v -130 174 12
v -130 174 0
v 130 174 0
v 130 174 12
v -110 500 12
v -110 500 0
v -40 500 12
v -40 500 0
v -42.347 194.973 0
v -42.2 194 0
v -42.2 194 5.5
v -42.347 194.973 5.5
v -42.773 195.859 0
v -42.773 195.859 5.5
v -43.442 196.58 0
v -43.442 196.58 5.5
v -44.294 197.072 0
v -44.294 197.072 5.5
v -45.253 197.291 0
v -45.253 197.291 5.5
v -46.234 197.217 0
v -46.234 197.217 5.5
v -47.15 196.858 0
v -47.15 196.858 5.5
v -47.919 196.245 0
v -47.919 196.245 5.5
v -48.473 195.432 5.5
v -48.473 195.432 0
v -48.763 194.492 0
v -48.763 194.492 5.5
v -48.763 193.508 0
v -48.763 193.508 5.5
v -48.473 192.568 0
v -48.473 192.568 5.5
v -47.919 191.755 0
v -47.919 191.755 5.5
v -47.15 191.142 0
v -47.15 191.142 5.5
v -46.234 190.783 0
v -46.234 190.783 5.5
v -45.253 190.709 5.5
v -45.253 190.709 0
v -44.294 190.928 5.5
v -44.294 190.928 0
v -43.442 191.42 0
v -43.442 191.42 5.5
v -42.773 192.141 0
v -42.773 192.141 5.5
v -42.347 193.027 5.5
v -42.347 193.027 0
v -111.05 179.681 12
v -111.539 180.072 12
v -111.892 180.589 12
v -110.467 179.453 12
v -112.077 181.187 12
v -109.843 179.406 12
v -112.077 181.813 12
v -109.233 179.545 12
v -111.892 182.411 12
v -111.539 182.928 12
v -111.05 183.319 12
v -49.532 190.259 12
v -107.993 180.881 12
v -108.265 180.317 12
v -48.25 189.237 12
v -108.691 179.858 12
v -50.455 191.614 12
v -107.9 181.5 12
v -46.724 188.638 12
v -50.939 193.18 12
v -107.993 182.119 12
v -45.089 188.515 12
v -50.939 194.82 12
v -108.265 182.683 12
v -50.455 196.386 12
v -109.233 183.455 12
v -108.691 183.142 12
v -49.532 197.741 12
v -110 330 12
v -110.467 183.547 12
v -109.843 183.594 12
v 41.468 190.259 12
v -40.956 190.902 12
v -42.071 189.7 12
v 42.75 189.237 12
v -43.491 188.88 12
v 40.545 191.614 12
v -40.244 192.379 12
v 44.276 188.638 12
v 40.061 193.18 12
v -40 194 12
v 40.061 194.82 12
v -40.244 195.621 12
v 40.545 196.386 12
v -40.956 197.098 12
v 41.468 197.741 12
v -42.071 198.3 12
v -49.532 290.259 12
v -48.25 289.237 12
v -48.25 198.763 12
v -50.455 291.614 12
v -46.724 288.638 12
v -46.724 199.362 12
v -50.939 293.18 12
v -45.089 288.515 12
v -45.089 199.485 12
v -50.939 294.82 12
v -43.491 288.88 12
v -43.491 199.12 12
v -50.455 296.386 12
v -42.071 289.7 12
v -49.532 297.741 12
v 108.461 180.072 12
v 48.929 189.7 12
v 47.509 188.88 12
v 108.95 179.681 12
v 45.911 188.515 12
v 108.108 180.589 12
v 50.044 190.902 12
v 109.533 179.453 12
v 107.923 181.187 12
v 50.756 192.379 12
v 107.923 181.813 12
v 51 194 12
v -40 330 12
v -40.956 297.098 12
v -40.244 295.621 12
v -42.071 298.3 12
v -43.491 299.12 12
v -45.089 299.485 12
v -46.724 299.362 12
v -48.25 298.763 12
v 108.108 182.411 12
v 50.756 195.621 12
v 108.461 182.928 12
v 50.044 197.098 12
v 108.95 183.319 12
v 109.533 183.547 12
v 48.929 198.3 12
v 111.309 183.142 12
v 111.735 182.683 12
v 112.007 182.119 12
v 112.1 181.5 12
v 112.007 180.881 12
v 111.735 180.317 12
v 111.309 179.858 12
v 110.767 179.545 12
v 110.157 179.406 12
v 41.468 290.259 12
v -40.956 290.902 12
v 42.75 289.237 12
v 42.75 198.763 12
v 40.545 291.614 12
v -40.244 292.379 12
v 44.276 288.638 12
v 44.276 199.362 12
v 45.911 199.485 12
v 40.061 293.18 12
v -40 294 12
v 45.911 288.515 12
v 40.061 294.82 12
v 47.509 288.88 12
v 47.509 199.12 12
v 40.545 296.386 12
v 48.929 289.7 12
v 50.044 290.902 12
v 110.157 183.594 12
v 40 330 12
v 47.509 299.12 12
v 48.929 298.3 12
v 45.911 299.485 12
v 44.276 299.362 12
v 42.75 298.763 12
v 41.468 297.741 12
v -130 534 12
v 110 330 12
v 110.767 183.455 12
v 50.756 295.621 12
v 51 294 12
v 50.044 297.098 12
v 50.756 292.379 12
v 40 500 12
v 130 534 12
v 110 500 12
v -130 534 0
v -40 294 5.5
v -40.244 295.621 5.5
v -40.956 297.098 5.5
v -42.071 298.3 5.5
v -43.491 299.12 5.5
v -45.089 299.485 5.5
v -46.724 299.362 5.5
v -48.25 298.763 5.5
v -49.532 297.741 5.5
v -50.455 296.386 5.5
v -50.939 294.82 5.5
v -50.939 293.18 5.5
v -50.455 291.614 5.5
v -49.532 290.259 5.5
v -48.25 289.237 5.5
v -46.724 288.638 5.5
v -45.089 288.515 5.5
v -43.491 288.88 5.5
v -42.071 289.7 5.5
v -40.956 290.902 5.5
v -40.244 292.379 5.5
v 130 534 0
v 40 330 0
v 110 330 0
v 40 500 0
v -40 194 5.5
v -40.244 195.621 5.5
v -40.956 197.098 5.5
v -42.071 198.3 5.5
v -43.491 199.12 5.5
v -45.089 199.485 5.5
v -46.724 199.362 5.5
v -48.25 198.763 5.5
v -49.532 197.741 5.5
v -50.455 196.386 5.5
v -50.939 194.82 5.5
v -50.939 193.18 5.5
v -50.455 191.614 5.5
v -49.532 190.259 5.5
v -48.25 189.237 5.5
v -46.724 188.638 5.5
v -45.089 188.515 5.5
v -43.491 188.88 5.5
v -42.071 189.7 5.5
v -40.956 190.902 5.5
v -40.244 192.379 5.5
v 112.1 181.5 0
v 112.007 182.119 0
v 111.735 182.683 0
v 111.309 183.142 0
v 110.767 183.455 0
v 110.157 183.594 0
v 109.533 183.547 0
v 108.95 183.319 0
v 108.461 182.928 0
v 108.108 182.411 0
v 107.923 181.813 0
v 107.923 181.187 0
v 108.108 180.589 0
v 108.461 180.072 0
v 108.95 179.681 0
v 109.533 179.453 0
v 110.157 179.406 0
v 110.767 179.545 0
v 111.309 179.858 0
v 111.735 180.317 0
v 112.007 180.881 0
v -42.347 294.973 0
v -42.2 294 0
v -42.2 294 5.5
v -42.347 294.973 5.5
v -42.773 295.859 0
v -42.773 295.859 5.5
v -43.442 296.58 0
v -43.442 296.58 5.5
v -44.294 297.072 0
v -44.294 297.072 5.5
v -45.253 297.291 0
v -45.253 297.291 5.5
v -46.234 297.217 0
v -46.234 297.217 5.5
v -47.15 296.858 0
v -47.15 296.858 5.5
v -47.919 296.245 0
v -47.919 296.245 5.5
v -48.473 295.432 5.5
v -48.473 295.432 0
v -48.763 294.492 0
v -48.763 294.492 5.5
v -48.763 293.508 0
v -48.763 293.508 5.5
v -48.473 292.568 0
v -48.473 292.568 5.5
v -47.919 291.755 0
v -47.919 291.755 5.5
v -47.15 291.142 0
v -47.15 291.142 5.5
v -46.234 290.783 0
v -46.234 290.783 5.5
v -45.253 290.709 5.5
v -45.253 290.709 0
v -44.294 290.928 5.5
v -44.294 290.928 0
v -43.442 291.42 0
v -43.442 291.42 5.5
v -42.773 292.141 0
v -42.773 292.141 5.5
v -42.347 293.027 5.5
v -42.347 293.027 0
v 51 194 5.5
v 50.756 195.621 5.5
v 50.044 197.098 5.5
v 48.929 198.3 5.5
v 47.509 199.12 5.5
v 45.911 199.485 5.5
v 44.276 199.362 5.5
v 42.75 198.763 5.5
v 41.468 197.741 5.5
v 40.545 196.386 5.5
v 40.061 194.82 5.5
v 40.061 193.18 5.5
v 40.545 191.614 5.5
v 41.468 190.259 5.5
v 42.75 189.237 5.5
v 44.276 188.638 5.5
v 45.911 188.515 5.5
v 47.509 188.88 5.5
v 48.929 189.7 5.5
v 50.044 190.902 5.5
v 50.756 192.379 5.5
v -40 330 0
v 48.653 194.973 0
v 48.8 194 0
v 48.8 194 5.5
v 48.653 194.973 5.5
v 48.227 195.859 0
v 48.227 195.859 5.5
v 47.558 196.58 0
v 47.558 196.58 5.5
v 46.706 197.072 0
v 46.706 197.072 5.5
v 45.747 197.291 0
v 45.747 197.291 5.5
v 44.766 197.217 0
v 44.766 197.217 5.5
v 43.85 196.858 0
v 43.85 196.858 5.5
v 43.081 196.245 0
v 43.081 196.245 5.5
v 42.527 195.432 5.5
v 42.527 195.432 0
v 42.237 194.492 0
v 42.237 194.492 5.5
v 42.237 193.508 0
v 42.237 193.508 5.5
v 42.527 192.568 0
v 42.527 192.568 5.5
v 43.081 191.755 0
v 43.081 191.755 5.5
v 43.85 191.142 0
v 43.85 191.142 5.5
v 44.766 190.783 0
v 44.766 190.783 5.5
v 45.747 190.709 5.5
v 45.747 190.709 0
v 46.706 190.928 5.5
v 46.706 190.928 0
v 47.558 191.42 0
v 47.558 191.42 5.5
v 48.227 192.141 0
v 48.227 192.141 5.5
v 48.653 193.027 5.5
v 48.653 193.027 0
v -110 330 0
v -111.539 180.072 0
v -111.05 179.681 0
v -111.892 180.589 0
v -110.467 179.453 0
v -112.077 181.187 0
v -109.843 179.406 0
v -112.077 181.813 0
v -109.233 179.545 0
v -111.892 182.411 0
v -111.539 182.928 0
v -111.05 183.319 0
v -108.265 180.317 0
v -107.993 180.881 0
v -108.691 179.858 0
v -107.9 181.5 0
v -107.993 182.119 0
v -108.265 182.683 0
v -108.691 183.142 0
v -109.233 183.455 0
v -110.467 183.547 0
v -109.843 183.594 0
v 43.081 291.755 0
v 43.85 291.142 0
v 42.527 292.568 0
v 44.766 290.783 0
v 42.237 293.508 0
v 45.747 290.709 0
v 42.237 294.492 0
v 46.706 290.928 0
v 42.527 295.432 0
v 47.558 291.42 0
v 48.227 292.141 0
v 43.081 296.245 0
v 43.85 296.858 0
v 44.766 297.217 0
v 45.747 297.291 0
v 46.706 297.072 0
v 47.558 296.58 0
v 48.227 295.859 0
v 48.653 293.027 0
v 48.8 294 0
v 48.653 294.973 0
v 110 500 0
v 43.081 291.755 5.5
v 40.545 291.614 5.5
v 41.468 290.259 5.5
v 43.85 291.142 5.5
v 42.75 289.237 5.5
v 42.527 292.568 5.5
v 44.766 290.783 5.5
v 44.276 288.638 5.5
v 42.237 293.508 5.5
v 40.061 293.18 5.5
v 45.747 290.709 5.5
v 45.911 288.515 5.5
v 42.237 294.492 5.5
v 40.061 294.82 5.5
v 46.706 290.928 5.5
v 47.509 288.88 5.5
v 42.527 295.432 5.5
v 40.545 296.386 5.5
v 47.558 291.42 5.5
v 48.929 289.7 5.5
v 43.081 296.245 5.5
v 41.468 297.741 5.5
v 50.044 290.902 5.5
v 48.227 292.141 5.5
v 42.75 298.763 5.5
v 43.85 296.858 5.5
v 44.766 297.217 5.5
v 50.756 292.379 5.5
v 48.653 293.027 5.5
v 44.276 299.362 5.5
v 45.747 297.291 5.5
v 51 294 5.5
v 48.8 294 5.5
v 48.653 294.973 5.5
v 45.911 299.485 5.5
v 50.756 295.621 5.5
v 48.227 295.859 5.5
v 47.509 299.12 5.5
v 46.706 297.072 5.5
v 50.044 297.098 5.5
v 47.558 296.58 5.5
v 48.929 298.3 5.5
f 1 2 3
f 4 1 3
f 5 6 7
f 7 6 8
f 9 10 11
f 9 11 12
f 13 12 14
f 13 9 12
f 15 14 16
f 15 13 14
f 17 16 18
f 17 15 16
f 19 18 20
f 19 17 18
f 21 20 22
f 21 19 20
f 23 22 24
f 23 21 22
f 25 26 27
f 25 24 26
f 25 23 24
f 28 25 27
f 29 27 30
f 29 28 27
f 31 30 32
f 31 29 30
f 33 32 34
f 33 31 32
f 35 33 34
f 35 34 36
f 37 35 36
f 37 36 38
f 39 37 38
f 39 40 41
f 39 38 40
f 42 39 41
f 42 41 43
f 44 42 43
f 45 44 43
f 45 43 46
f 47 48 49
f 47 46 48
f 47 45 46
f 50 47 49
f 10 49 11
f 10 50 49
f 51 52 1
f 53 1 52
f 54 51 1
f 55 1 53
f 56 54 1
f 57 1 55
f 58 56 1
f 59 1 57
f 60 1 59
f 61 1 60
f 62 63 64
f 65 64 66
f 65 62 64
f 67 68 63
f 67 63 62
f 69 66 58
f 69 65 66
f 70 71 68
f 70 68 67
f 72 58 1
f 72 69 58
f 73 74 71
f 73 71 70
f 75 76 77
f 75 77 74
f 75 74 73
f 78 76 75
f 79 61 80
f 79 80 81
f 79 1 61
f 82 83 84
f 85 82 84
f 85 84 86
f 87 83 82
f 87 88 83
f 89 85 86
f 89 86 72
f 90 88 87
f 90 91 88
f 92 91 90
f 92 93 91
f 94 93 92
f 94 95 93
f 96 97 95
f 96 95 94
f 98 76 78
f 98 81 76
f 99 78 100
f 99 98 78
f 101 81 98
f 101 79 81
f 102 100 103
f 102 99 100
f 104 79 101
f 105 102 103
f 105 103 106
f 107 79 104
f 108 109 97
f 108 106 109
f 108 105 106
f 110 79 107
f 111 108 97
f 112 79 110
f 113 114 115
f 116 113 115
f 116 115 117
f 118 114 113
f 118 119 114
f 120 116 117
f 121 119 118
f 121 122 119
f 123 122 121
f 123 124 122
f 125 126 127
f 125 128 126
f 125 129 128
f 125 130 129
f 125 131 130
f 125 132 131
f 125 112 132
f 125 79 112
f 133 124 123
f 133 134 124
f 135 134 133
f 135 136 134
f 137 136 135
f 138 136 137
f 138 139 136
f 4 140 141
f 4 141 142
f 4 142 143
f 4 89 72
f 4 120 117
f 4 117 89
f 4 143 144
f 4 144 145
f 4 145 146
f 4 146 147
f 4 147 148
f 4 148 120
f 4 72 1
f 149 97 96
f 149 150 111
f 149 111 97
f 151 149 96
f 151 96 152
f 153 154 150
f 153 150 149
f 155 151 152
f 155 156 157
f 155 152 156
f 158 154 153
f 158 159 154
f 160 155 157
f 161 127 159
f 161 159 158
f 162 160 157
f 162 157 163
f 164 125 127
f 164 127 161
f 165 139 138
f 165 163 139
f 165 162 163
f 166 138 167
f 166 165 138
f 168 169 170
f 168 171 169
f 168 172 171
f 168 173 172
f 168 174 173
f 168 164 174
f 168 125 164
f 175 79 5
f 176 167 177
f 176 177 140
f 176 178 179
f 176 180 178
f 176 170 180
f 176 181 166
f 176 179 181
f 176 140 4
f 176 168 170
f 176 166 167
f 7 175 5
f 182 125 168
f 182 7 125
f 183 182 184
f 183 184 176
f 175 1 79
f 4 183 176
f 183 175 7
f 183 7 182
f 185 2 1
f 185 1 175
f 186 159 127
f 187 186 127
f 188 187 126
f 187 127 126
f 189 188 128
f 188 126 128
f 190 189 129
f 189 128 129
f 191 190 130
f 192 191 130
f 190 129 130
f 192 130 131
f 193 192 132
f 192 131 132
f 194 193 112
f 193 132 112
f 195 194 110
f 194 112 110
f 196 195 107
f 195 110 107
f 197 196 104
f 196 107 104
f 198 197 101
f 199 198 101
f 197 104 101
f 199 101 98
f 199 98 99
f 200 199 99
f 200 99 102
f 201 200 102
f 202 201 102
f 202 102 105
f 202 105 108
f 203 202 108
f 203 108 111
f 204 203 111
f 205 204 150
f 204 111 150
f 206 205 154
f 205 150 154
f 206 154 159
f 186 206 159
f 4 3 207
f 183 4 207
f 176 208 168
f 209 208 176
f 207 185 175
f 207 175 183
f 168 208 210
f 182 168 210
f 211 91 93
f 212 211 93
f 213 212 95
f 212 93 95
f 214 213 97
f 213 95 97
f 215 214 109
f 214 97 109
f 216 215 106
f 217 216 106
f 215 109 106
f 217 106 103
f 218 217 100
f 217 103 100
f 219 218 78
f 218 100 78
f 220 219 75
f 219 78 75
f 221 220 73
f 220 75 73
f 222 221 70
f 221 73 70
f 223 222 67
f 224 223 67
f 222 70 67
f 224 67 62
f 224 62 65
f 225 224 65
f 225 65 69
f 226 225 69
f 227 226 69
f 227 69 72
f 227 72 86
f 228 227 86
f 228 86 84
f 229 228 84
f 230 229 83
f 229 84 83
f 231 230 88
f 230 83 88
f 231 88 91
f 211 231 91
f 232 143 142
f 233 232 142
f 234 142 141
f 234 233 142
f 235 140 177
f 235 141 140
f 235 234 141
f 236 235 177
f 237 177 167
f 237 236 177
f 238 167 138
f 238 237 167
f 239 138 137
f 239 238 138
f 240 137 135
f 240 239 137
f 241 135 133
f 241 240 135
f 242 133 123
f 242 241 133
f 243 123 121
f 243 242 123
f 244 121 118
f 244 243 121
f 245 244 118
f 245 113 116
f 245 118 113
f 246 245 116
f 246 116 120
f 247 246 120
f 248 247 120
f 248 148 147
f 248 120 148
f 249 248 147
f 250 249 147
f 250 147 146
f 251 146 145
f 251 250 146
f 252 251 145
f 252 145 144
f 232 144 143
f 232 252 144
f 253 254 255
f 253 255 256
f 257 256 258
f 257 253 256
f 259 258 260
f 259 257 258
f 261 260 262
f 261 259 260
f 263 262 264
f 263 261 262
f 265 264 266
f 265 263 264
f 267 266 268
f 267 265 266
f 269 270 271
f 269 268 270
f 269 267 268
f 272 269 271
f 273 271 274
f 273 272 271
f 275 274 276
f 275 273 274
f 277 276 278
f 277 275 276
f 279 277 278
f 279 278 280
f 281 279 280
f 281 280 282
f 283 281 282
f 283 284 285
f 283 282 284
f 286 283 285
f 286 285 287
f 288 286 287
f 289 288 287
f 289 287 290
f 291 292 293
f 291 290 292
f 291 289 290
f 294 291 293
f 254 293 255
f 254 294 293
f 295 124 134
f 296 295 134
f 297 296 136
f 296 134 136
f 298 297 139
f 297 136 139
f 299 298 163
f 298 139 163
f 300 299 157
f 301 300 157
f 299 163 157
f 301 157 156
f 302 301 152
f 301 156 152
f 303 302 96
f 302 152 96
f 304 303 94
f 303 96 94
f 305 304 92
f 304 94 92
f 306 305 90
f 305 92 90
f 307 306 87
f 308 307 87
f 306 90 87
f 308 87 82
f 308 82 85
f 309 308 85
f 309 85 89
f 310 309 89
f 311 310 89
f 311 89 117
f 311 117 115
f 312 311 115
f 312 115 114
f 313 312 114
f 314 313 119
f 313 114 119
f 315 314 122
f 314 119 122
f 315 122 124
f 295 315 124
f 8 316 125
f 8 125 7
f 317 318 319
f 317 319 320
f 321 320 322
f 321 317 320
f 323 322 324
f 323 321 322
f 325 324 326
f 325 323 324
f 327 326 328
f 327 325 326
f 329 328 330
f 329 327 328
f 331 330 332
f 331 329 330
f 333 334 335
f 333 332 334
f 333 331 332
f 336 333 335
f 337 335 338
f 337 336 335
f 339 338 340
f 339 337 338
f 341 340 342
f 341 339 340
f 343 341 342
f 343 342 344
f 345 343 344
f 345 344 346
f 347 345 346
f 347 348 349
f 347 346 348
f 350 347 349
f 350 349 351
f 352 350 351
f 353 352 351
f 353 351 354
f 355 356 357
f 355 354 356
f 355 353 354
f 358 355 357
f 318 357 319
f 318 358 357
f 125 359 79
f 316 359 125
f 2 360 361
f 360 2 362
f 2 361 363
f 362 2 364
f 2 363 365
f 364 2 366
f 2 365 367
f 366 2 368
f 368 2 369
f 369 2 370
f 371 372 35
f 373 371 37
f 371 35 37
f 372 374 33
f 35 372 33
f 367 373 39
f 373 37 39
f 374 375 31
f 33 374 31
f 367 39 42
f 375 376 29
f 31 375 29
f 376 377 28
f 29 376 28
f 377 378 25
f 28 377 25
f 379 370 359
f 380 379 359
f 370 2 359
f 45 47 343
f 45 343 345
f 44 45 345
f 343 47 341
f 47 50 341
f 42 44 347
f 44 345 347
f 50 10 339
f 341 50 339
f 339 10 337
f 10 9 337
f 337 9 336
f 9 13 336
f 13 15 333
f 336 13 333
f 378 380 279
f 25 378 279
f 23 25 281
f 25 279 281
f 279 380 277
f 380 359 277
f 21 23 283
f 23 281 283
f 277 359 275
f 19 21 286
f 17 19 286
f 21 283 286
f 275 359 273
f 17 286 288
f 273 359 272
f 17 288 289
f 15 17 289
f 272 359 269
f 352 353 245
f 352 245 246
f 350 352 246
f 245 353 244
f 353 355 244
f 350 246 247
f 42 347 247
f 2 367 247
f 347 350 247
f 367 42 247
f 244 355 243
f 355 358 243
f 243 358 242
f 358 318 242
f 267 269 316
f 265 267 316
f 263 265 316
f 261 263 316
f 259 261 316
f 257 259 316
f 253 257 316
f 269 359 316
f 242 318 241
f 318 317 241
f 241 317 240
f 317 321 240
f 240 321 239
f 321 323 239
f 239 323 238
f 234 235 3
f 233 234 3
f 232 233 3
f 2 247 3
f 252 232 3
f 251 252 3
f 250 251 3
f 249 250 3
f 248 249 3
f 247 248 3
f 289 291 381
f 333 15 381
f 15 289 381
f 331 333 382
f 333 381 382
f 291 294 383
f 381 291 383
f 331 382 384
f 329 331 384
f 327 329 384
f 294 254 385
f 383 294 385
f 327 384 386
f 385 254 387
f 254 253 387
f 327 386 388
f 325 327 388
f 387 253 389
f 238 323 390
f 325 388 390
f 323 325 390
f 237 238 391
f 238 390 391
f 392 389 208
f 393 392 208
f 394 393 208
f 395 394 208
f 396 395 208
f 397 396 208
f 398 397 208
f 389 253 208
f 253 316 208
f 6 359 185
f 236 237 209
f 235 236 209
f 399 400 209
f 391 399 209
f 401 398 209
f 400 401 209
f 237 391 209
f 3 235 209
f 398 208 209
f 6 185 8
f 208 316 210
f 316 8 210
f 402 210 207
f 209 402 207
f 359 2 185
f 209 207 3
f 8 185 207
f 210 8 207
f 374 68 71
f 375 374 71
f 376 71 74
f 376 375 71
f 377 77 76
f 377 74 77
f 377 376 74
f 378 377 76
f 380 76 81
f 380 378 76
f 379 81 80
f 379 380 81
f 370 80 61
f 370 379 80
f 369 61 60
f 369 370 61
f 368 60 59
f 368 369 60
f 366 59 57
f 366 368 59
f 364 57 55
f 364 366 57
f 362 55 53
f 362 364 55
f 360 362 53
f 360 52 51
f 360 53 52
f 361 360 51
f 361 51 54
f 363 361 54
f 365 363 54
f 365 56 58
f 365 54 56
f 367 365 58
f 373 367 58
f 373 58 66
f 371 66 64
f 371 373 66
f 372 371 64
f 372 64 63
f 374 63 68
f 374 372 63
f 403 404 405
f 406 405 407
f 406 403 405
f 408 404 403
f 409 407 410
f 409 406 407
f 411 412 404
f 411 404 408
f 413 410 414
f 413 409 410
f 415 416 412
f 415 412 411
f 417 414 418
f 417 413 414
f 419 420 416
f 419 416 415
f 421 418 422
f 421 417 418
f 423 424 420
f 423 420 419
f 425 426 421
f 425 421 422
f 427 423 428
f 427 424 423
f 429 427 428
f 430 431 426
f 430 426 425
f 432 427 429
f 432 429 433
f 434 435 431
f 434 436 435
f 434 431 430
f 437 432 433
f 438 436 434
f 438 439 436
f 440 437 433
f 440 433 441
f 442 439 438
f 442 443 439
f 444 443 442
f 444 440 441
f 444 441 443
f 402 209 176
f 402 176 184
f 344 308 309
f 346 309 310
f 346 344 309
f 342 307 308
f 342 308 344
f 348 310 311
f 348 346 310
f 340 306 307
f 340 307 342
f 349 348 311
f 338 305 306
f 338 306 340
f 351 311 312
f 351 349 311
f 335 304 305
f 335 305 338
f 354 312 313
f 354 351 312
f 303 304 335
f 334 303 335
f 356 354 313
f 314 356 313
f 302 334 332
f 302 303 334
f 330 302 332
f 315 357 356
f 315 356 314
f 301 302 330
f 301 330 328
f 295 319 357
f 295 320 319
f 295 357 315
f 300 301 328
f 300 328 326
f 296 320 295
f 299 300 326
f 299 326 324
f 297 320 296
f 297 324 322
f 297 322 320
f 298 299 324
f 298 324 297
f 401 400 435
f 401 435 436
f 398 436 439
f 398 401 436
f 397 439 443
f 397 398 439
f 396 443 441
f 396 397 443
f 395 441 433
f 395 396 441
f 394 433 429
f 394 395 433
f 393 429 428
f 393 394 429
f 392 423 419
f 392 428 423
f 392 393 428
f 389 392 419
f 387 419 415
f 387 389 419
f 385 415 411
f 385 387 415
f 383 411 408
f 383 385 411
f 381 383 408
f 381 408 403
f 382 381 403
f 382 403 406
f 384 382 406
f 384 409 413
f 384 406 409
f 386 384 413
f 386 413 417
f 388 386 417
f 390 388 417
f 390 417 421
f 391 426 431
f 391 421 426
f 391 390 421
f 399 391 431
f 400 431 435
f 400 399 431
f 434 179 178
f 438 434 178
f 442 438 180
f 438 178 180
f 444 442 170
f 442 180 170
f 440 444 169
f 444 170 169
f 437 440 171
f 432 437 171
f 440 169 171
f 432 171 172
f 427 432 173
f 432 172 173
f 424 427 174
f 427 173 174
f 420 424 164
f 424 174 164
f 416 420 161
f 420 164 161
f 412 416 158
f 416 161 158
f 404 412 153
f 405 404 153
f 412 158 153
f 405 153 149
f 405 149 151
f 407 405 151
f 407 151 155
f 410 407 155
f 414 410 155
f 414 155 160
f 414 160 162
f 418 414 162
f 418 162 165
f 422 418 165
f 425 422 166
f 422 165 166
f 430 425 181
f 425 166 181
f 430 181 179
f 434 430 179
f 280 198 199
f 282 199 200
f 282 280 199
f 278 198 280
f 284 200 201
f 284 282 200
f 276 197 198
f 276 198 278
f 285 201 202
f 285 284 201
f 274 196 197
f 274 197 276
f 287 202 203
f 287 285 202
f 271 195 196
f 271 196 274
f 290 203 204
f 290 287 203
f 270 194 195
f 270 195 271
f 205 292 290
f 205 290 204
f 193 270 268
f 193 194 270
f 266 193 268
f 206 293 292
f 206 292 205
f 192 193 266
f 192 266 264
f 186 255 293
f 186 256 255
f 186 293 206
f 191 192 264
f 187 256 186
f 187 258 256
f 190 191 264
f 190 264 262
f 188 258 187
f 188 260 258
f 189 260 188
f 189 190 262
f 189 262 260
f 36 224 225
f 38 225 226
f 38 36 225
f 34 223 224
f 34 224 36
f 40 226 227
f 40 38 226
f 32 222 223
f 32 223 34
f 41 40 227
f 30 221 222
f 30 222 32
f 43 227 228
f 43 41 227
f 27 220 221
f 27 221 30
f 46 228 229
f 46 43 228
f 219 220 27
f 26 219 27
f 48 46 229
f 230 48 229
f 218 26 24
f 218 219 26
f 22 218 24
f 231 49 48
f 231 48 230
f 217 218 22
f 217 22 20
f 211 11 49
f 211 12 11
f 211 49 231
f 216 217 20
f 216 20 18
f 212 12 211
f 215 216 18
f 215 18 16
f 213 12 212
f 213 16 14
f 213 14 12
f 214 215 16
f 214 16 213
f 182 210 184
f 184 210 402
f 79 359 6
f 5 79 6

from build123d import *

# Parameters (mm, degrees)
SKETCH1_W               = 260
SKETCH1_H               = 360
BOSS_EXTRUDE1_DEPTH     = 12
CUT_EXTRUDE1_DEPTH      = 550.727205075
CUT_EXTRUDE1_DEPTH_BACK = 550.727205075
SKETCH2_R               = 3.3
SKETCH3_R               = 5.5
CUT_EXTRUDE3_DEPTH      = 6.5
CUT_EXTRUDE4_DEPTH      = 550.727205075
CUT_EXTRUDE4_DEPTH_BACK = 550.727205075
SKETCH4_R               = 2.1
CUT_EXTRUDE5_DEPTH      = 550.727205075
CUT_EXTRUDE5_DEPTH_BACK = 550.727205075
SKETCH5_W               = 70
SKETCH5_H               = 170


with BuildPart() as part:
    # Sketch1 → Boss-Extrude1 (new body)
    with BuildSketch(Plane.XY):
        with Locations((0, 354)):
            Rectangle(SKETCH1_W, SKETCH1_H)
    extrude(amount=BOSS_EXTRUDE1_DEPTH)

    # Sketch2 → Cut-Extrude1 (cut, two sides: drawn at the far end of the back side and taken through both)
    with BuildSketch(Plane.XY.offset(-CUT_EXTRUDE1_DEPTH_BACK)):
        with Locations((-45.5, 194)):
            Circle(SKETCH2_R)
        with Locations((-45.5, 294)):
            Circle(SKETCH2_R)
        with Locations((45.5, 194)):
            Circle(SKETCH2_R)
        with Locations((45.5, 294)):
            Circle(SKETCH2_R)
    extrude(amount=CUT_EXTRUDE1_DEPTH + CUT_EXTRUDE1_DEPTH_BACK, mode=Mode.SUBTRACT)

    # Sketch3 → Cut-Extrude3 (cut)
    with BuildSketch(Plane.XY.offset(12)):
        with Locations((-45.5, 194)):
            Circle(SKETCH3_R)
        with Locations((-45.5, 294)):
            Circle(SKETCH3_R)
        with Locations((45.5, 194)):
            Circle(SKETCH3_R)
        with Locations((45.5, 294)):
            Circle(SKETCH3_R)
    extrude(amount=-CUT_EXTRUDE3_DEPTH, mode=Mode.SUBTRACT)

    # Sketch4 → Cut-Extrude4 (cut, two sides: drawn at the far end of the back side and taken through both)
    with BuildSketch(Plane.XY.offset(-CUT_EXTRUDE4_DEPTH_BACK)):
        with Locations((-110, 181.5)):
            Circle(SKETCH4_R)
        with Locations((110, 181.5)):
            Circle(SKETCH4_R)
    extrude(amount=CUT_EXTRUDE4_DEPTH + CUT_EXTRUDE4_DEPTH_BACK, mode=Mode.SUBTRACT)

    # Sketch5 → Cut-Extrude5 (cut, two sides: drawn at the far end of the back side and taken through both)
    with BuildSketch(Plane.XY.offset(-CUT_EXTRUDE5_DEPTH_BACK)):
        with Locations((-75, 415)):
            Rectangle(SKETCH5_W, SKETCH5_H)
        with Locations((75, 415)):
            Rectangle(SKETCH5_W, SKETCH5_H)
    extrude(amount=CUT_EXTRUDE5_DEPTH + CUT_EXTRUDE5_DEPTH_BACK, mode=Mode.SUBTRACT)


solid = part.part
